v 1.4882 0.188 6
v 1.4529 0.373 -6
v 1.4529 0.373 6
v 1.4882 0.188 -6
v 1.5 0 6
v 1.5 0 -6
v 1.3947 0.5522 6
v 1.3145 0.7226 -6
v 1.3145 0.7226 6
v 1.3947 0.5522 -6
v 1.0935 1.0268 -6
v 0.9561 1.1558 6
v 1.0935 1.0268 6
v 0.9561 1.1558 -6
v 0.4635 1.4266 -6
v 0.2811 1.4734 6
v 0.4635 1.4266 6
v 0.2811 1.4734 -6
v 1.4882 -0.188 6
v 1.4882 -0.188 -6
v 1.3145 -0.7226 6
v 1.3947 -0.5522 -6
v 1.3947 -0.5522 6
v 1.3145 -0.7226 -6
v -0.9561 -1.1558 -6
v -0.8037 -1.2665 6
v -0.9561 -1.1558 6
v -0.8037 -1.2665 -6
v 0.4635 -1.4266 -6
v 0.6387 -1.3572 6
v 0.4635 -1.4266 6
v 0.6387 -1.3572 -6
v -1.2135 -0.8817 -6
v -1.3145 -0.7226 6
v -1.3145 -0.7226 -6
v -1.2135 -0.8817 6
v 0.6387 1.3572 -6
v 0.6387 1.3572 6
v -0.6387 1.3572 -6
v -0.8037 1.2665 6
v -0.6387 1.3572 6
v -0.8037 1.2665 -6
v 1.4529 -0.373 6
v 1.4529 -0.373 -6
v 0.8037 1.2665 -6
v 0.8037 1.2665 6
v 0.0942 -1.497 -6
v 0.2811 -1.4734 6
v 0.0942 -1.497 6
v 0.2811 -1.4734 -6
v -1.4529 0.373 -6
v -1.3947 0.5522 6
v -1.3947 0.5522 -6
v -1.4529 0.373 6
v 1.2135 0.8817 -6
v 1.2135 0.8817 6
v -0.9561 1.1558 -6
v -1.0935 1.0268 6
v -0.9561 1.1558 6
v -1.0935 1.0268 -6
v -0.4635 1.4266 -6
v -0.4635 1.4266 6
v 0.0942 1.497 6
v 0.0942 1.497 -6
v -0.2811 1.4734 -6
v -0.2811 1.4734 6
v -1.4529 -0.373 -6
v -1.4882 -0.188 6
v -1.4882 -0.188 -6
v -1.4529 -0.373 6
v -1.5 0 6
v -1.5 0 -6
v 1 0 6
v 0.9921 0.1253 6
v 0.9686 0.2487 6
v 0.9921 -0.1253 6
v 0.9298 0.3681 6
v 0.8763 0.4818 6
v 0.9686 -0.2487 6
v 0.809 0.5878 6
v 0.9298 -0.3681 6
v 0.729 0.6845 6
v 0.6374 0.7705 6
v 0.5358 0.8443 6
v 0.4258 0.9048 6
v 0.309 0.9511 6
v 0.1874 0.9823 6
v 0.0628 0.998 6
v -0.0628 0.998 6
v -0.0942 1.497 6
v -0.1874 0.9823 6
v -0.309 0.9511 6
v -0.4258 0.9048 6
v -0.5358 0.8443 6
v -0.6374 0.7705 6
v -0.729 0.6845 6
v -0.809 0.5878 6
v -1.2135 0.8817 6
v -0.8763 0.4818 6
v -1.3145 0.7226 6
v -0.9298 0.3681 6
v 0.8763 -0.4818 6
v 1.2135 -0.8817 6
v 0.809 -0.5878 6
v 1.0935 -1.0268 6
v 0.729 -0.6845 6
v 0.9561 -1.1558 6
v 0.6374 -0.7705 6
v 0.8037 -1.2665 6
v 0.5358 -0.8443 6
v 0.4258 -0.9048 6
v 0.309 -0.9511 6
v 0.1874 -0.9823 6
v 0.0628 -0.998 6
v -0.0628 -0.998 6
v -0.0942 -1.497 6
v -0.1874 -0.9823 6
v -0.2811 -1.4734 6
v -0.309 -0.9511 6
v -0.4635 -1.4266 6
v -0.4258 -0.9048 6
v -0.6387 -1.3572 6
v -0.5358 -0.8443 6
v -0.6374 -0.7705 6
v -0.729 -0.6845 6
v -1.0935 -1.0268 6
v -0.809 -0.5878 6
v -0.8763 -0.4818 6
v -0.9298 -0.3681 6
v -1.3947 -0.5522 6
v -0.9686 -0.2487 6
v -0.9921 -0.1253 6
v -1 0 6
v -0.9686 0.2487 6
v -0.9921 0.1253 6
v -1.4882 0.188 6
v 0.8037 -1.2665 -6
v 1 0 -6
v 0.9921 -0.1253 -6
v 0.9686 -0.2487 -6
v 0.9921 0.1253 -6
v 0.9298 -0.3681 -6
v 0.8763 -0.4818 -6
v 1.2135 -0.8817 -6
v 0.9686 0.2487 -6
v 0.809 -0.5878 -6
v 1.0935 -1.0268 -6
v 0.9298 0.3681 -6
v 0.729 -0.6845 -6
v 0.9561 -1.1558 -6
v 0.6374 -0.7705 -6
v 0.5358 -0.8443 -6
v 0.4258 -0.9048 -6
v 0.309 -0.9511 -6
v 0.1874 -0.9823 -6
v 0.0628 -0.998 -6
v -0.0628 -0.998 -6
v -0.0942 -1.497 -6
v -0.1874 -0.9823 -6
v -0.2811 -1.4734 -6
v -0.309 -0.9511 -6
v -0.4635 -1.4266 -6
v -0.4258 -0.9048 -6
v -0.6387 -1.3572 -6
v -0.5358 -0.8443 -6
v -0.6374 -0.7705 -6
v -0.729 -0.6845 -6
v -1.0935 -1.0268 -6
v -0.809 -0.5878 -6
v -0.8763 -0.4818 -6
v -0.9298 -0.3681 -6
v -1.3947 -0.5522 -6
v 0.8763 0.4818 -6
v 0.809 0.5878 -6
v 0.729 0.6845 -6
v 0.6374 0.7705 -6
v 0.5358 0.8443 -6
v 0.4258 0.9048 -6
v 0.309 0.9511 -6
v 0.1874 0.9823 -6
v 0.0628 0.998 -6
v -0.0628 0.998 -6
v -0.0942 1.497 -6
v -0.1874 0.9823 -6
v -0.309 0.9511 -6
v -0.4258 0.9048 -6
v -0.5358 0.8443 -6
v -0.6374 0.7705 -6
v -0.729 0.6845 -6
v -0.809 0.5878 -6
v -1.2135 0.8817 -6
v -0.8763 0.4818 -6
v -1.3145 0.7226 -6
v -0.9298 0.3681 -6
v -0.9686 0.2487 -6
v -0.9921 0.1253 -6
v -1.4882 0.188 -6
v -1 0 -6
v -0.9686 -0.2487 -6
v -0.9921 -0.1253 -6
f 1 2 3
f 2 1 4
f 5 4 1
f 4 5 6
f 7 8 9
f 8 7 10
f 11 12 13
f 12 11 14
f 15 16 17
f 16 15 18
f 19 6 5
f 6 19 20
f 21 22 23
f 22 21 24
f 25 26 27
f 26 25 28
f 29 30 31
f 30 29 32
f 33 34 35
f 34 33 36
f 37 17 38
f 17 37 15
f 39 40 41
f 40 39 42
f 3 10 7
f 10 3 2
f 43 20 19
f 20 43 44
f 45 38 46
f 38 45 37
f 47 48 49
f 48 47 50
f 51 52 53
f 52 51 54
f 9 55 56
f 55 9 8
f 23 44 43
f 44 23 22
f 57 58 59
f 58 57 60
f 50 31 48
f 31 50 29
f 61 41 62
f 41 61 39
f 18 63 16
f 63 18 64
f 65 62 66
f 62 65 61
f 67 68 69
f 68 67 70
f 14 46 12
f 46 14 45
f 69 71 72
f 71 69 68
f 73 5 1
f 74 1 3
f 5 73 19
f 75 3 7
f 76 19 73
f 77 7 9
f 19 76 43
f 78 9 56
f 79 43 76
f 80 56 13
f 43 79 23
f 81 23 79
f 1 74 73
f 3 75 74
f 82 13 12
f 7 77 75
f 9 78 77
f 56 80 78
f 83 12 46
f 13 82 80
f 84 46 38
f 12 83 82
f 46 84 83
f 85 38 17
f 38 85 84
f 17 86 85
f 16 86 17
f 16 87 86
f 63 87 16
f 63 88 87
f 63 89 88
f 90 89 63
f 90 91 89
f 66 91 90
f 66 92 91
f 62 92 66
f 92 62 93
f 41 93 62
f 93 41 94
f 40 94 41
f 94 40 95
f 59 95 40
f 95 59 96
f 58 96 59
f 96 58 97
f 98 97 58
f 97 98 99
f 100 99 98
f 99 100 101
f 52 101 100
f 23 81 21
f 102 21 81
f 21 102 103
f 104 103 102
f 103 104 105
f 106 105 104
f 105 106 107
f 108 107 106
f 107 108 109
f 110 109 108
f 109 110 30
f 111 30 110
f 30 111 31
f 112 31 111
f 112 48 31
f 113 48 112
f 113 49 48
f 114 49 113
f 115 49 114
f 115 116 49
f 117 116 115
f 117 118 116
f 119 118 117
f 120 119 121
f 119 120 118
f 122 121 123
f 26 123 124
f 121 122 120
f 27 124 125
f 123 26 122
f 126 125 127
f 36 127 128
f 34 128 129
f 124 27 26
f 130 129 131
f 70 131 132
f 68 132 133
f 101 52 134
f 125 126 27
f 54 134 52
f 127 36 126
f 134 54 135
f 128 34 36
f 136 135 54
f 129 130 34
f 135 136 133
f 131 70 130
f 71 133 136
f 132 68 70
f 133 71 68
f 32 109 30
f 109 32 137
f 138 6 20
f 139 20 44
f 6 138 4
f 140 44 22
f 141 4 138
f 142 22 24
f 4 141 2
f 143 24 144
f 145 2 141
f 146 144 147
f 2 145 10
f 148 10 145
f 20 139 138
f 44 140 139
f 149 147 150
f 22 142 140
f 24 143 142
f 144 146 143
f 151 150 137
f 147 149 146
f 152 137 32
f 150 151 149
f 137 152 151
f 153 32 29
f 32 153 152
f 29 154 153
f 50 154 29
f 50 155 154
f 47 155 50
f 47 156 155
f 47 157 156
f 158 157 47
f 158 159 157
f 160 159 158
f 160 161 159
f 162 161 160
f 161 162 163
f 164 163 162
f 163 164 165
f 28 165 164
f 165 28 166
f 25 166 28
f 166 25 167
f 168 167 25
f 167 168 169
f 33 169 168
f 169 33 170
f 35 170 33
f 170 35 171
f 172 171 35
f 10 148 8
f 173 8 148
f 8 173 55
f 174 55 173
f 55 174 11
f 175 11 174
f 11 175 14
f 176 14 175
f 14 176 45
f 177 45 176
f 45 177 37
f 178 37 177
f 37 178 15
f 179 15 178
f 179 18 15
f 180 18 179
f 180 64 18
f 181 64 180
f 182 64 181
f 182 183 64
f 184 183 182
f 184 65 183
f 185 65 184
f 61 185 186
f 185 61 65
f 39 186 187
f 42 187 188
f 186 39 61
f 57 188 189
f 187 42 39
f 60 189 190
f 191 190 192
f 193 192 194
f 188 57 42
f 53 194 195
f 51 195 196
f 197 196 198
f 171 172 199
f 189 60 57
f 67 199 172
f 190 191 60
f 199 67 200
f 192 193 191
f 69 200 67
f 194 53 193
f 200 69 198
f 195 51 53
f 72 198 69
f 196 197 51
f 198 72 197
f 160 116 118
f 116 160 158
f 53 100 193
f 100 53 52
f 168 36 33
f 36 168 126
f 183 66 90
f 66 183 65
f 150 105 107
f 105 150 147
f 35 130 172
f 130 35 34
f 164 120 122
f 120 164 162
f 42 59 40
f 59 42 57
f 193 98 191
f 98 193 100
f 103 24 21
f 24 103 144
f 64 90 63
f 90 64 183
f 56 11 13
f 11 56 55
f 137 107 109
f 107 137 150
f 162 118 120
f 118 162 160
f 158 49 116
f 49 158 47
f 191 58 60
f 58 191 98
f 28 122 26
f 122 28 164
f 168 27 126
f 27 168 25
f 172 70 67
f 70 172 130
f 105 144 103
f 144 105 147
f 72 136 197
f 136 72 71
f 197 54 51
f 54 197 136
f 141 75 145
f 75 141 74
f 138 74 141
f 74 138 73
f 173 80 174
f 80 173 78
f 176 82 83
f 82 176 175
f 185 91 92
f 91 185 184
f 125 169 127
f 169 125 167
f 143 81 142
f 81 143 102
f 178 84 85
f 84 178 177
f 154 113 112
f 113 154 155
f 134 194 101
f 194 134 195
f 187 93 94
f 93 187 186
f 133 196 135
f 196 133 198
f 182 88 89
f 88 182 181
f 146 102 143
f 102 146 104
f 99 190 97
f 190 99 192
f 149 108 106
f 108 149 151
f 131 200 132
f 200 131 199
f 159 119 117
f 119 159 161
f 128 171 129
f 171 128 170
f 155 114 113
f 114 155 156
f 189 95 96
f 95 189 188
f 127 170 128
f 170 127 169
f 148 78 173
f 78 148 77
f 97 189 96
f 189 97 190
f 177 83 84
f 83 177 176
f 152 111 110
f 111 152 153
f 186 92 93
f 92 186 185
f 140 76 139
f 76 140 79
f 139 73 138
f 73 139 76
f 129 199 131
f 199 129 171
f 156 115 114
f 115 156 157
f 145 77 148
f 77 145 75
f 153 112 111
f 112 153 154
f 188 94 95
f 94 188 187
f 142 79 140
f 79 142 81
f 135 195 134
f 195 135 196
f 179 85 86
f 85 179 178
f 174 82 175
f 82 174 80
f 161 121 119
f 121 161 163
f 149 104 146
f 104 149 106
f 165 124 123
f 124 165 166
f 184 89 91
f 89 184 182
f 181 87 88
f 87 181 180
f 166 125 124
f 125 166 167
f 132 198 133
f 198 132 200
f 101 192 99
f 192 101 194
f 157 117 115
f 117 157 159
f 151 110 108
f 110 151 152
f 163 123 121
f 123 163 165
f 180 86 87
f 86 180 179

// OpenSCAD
$fn = 50;


difference() {
	union() {
		translate(v = [0, 0, -6.0000000000]) {
			cylinder(h = 12, r = 1.5000000000);
		}
	}
	union() {
		translate(v = [0, 0, -100.0000000000]) {
			cylinder(h = 200, r = 1.0000000000);
		}
	}
}
